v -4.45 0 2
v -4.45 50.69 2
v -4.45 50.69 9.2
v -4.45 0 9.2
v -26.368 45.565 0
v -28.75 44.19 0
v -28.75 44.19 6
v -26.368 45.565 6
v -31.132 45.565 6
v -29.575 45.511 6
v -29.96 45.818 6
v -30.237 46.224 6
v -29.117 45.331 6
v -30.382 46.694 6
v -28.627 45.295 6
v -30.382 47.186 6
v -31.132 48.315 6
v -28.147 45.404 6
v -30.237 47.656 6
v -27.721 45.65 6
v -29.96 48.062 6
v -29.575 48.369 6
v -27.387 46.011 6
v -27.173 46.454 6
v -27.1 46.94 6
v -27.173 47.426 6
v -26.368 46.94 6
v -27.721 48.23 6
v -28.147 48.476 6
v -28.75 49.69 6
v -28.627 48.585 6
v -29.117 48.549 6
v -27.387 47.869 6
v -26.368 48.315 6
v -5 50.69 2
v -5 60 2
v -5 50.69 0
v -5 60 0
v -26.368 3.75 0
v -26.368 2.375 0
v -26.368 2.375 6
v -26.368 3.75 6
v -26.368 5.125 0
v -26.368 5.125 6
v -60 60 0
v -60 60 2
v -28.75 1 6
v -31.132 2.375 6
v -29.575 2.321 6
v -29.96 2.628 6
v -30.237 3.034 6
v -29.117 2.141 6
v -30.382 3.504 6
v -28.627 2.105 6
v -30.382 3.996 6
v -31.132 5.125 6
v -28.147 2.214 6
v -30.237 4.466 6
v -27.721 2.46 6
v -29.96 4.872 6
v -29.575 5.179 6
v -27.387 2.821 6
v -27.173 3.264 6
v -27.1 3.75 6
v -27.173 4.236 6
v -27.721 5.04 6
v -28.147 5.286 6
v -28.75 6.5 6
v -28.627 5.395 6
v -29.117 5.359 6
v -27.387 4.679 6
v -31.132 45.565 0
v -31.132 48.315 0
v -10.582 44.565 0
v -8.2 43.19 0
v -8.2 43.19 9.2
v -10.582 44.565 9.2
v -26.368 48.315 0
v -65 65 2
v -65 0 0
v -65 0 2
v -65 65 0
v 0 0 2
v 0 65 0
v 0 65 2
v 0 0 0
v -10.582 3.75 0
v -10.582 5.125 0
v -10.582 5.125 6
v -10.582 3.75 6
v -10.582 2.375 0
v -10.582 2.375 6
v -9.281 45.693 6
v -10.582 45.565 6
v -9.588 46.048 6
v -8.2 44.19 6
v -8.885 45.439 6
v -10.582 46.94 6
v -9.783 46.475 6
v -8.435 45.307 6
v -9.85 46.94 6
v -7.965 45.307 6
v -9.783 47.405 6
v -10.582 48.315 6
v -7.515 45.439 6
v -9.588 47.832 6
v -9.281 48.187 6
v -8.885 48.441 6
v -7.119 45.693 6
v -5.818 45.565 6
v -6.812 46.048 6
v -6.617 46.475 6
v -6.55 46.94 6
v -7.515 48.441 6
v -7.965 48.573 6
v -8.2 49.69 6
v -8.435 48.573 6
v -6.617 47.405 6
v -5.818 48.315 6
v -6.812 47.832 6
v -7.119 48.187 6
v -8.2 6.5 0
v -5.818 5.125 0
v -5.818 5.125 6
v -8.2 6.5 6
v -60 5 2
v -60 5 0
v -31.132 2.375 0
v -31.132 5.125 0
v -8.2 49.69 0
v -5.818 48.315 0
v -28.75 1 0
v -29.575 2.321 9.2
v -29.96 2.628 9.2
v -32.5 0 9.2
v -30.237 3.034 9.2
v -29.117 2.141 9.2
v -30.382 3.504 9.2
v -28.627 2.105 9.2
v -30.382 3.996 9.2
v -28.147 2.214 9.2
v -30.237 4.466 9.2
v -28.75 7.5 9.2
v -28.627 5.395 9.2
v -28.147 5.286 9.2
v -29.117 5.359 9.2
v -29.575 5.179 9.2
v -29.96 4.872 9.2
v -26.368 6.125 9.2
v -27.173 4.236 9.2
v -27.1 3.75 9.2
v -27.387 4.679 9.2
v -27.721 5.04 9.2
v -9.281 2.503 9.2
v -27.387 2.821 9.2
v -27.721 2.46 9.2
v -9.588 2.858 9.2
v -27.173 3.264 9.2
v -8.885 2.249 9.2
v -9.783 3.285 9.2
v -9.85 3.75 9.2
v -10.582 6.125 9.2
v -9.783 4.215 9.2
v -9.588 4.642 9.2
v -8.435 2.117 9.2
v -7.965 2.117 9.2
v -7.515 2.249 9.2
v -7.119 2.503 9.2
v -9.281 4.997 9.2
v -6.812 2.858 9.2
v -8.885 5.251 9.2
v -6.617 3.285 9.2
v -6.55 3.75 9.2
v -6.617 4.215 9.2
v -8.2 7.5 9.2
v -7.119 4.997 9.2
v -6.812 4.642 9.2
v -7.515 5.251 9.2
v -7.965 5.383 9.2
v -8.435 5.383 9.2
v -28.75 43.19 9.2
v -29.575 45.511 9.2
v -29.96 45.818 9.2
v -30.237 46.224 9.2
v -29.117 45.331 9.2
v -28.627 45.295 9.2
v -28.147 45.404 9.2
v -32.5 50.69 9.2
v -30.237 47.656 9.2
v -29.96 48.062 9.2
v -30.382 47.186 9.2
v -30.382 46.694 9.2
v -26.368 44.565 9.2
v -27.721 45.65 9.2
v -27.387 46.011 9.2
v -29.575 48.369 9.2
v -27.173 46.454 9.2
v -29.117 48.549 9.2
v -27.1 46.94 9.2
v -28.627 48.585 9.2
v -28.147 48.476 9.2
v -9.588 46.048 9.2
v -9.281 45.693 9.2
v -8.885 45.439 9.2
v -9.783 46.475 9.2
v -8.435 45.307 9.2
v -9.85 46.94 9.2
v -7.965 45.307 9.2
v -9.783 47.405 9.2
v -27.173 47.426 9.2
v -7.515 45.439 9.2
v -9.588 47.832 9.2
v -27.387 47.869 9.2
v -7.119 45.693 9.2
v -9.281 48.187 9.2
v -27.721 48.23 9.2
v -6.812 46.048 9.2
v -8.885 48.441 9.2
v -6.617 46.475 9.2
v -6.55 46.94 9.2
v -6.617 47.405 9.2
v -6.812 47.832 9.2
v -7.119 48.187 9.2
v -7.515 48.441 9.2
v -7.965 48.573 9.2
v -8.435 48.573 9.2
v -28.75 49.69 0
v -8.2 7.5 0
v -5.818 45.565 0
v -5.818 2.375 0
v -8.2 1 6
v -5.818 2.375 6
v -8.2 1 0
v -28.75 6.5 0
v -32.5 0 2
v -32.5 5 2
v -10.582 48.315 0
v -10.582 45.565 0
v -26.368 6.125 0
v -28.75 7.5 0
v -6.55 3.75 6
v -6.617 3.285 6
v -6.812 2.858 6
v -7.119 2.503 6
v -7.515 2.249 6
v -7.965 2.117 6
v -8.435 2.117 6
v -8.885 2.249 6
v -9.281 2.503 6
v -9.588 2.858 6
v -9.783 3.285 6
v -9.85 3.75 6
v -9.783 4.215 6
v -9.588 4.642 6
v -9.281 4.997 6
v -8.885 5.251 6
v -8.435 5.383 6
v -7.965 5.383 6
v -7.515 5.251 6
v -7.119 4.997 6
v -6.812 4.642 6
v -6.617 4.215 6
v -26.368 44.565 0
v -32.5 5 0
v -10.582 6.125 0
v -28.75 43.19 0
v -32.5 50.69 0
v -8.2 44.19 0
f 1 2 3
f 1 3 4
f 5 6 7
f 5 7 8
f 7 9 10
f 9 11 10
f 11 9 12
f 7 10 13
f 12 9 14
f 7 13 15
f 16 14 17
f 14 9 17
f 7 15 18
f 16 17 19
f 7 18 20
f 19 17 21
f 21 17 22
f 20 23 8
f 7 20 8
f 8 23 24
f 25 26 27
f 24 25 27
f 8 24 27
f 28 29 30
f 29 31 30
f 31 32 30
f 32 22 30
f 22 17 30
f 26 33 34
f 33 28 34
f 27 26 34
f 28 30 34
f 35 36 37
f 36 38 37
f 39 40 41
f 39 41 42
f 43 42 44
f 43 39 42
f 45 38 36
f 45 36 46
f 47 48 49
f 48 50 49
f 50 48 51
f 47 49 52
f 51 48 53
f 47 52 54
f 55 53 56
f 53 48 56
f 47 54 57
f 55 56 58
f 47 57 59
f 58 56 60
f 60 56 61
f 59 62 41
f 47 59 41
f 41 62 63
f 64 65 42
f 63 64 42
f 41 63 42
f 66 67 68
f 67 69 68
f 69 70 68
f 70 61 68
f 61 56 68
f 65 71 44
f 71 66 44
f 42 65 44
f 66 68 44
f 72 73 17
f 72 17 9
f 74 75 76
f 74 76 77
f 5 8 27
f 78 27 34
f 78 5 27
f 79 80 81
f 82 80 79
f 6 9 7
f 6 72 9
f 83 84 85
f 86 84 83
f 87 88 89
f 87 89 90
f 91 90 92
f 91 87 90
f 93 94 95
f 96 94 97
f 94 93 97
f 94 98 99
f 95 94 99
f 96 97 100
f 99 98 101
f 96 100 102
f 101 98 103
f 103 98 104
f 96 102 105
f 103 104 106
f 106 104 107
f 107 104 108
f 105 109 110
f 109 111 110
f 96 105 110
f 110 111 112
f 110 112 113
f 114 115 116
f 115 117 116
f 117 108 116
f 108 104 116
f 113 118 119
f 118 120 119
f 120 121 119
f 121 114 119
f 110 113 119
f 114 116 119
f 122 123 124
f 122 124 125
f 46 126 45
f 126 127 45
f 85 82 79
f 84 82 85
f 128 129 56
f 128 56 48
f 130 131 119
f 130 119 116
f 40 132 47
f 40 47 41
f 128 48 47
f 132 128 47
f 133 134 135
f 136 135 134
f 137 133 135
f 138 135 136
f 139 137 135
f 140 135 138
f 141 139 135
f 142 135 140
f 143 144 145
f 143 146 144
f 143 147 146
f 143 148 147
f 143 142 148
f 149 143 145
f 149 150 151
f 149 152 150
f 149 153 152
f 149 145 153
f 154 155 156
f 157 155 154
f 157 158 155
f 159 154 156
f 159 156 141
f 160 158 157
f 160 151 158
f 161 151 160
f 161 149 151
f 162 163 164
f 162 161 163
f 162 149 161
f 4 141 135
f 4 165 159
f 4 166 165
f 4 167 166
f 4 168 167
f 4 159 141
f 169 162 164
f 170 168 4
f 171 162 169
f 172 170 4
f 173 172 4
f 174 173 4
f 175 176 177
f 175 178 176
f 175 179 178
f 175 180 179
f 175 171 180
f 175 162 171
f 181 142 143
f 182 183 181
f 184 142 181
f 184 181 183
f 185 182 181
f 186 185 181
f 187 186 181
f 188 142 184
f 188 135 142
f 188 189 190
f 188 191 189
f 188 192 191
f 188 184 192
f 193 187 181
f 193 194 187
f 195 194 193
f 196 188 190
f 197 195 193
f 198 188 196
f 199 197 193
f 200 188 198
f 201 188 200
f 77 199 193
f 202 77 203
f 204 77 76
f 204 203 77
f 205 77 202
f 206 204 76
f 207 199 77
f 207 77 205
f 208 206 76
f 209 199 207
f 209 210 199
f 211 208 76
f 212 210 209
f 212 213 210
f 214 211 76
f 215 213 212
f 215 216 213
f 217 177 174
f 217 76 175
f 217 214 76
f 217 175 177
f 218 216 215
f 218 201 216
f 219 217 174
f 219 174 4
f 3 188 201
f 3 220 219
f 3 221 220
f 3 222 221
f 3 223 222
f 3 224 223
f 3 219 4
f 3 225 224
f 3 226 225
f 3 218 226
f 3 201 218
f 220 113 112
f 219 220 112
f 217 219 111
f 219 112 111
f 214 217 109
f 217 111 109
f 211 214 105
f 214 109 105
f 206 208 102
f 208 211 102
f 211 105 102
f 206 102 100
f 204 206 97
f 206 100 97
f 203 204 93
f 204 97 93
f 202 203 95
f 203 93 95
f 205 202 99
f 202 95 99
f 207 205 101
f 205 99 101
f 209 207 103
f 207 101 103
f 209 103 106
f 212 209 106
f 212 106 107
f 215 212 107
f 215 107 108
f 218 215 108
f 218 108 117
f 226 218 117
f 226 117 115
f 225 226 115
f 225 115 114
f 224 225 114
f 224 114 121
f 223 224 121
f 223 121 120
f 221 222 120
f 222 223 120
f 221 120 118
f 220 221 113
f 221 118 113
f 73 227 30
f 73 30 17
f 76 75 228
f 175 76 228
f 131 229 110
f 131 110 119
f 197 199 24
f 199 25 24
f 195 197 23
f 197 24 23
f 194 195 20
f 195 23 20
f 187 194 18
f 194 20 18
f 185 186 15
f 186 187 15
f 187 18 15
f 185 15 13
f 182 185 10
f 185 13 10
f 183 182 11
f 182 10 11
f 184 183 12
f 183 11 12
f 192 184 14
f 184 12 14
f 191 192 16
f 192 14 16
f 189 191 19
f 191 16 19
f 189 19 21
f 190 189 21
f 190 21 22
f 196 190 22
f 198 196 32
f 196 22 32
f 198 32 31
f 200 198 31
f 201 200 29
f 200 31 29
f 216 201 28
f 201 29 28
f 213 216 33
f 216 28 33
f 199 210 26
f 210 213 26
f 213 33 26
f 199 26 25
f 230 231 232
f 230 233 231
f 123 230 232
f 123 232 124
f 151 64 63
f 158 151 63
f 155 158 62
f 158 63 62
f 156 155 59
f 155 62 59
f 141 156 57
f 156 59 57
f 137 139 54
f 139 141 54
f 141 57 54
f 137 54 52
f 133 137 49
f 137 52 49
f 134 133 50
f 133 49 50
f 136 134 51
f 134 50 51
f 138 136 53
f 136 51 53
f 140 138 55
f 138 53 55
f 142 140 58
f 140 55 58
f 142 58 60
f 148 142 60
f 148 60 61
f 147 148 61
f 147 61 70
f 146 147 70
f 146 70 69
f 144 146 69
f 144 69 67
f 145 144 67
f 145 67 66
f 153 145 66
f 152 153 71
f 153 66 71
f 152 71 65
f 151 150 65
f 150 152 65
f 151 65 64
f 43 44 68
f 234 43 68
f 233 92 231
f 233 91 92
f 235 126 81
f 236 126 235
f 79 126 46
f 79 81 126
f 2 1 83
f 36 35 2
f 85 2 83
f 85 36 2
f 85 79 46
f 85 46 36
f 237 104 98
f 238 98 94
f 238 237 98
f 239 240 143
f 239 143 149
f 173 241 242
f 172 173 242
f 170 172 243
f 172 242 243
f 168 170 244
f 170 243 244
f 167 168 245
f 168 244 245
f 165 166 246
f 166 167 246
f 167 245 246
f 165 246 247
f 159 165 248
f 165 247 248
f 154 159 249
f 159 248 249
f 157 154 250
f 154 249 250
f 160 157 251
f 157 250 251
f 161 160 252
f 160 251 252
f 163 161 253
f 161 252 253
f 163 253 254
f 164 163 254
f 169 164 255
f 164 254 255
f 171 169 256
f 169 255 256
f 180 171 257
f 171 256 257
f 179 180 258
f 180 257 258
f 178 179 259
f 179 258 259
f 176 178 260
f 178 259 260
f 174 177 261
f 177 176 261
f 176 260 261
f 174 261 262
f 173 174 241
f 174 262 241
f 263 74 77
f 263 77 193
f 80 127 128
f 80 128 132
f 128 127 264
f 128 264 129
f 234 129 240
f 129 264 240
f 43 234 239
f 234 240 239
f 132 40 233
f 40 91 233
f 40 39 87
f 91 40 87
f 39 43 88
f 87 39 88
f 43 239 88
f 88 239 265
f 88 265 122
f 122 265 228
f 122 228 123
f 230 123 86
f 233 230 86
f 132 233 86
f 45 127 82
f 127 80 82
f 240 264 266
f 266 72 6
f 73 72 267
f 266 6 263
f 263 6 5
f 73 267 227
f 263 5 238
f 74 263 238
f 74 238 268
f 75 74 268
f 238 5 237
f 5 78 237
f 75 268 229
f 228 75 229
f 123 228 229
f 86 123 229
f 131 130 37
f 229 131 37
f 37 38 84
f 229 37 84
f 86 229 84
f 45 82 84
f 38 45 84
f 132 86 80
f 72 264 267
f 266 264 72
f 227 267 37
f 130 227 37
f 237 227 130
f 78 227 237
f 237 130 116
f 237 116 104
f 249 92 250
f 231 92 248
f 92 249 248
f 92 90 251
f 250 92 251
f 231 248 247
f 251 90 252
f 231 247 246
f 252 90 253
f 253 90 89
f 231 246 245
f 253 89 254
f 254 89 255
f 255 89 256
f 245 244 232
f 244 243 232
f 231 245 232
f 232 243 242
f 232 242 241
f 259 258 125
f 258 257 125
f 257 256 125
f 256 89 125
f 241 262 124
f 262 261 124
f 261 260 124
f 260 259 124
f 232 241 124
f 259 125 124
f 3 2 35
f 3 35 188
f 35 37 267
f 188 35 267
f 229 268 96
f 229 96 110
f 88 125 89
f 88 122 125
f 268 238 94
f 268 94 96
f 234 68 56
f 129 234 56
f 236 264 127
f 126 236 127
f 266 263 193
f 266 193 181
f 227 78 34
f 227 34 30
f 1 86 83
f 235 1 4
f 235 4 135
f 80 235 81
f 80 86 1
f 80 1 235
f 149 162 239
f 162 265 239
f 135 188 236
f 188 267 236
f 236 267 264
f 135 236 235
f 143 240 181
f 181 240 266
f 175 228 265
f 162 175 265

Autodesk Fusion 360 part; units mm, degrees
sketch "Sketch1" plane through (0, 0, 0) normal (0, 0, 1) x (1, 0, 0)
  line L0 (0, 0) -> (-65, 0)
  line L1 (-65, 0) -> (-65, 65)
  line L2 (-65, 65) -> (0, 65)
  line L3 (0, 65) -> (0, 0)
  line L4 (-32.5, 65) -> (-32.5, 0)
  line L5 (-28.75, 1) -> (-26.3684, 2.375)
  line L6 (-26.3684, 2.375) -> (-26.3684, 5.125)
  line L7 (-26.3684, 5.125) -> (-28.75, 6.5)
  line L8 (-28.75, 6.5) -> (-31.1316, 5.125)
  line L9 (-31.1316, 5.125) -> (-31.1316, 2.375)
  line L10 (-31.1316, 2.375) -> (-28.75, 1)
  line L11 (-28.75, 44.19) -> (-26.3684, 45.565)
  line L12 (-26.3684, 45.565) -> (-26.3684, 48.315)
  line L13 (-26.3684, 48.315) -> (-28.75, 49.69)
  line L14 (-28.75, 49.69) -> (-31.1316, 48.315)
  line L15 (-31.1316, 48.315) -> (-31.1316, 45.565)
  line L16 (-31.1316, 45.565) -> (-28.75, 44.19)
  line L17 (-28.75, 49.69) -> (-28.75, 50.69)
  line L18 (-28.75, 50.69) -> (-32.5, 50.69)
  line L19 (-28.75, 50.69) -> (0, 50.69)
  line L20 (-65, 0) -> (-60, 0)
  line L21 (-60, 0) -> (-60, 5)
  line L22 (-60, 5) -> (-65, 5)
  line L23 (-65, 5) -> (-65, 0)
  line L24 (-65, 65) -> (-60, 65)
  line L25 (-60, 65) -> (-60, 60)
  line L26 (-60, 60) -> (-65, 60)
  line L27 (-65, 60) -> (-65, 65)
  line L28 (0, 65) -> (-5, 65)
  line L29 (-5, 65) -> (-5, 60)
  line L30 (-5, 60) -> (0, 60)
  line L31 (0, 60) -> (0, 65)
  line L32 (-5, 60) -> (-60, 60)
  line L33 (-60, 60) -> (-60, 65)
  line L34 (-60, 65) -> (-5, 65)
  line L35 (-5, 65) -> (-5, 60)
  line L36 (-60, 60) -> (-65, 60)
  line L37 (-65, 60) -> (-65, 5)
  line L38 (-65, 5) -> (-60, 5)
  line L39 (-60, 5) -> (-60, 60)
  line L40 (-60, 0) -> (-32.5, 0)
  line L41 (-32.5, 0) -> (-32.5, 5)
  line L42 (-32.5, 5) -> (-60, 5)
  line L43 (-60, 5) -> (-60, 0)
  line L44 (-28.75, 6.5) -> (-28.75, 7.5)
  line L45 (-28.75, 7.5) -> (-26.3684, 6.125)
  line L46 (-28.75, 44.19) -> (-28.75, 43.19)
  line L47 (-3.75, 44.19) -> (-3.75, 43.19)
  line L48 (-26.3684, 44.565) -> (-28.75, 43.19)
  line L49 (-28.75, 7.5) -> (-28.75, 43.19)
  circle A0 centre (-28.75, 46.94) radius 1.65
  circle A1 centre (-28.75, 3.75) radius 1.65
  line L50 (-5, 60) -> (-5, 50.69)
  line L51 (-28.75, 46.94) -> (-8.2, 46.94)
  circle A2 centre (-8.2, 46.94) radius 1.65
  line L52 (-28.75, 3.75) -> (-8.2, 3.75)
  circle A3 centre (-8.2, 3.75) radius 1.65
  line L53 (-8.2, 1) -> (-5.8184, 2.375)
  line L54 (-5.8184, 2.375) -> (-5.8184, 5.125)
  line L55 (-5.8184, 5.125) -> (-8.2, 6.5)
  line L56 (-8.2, 6.5) -> (-10.5816, 5.125)
  line L57 (-10.5816, 5.125) -> (-10.5816, 2.375)
  line L58 (-10.5816, 2.375) -> (-8.2, 1)
  line L59 (-8.2, 44.19) -> (-5.8184, 45.565)
  line L60 (-5.8184, 45.565) -> (-5.8184, 48.315)
  line L61 (-5.8184, 48.315) -> (-8.2, 49.69)
  line L62 (-8.2, 49.69) -> (-10.5816, 48.315)
  line L63 (-10.5816, 48.315) -> (-10.5816, 45.565)
  line L64 (-10.5816, 45.565) -> (-8.2, 44.19)
  line L65 (-8.2, 44.19) -> (-8.2, 43.19)
  line L66 (-8.2, 43.19) -> (-10.5816, 44.565)
  line L67 (-10.5816, 44.565) -> (-26.3684, 44.565)
  line L68 (-8.2, 43.19) -> (-8.2, 7.5)
  line L69 (-8.2, 7.5) -> (-10.5816, 6.125)
  line L70 (-10.5816, 6.125) -> (-26.3684, 6.125)
  line L71 (-8.2, 25.345) -> (-4.45, 25.345)
  line L72 (-4.45, 25.345) -> (-4.45, 0)
  line L73 (-4.45, 25.345) -> (-4.45, 50.69)
  point P0 (-28.75, 3.75)
  point P1 (-28.75, 46.94)
  point P2 (-8.2, 3.75)
  point P3 (-8.2, 46.94)
  dimension "d1" = 65
  dimension "d2" = 65
  dimension "d10" = 43.19
  dimension "d12" = 2.75
  dimension "d14" = 1
  dimension "d15" = 1
  dimension "d17" = 3.3
  dimension "d20" = 3.3
  dimension "d27" = 20.55
  dimension "d28" = 3.3
  dimension "d29" = 20.55
  dimension "d30" = 3.3
  dimension "d31" = 2.75
  dimension "d32" = 1
  dimension "d33" = 3.75
extrude "Extrude4" add sketch "Sketch1" along normal blind 9.2 contours L53 L54 L55 L56 L57 L58 | L5 L6 L7 L8 L9 L10 | L0 L4 L14 L15 L16 L17 L18 L41 L45 L46 L49 L68 L69 L70 L71 L72 | L12 L13 L17 L19 L51 L59 L60 L61 L62 L63 L65 L68 L71 L73 | L11 L12 L46 L48 L51 L63 L64 L65 L66 L67 | L59 L60 L61 L62 L63 L64 | L11 L12 L13 L14 L15 L16
extrude "Extrude5" add sketch "Sketch1" along normal blind 2 contours L0 L3 L19 L72 L73 | L3 L19 L30 L50 | L0 L4 L21 L40 L41 L42 L43 | L2 L3 L28 L29 L30 L31 L35 | L0 L1 L20 L21 L22 L23 L38 L43 | L2 L4 L29 L32 L34 L35 | L1 L22 L26 L36 L37 L38 L39 | L2 L4 L25 L32 L33 L34 | L1 L2 L24 L25 L26 L27 L33 L36
extrude "Extrude6" cut sketch "Sketch1" along normal blind 6 contours L53 L54 L55 L56 L57 L58 | L5 L6 L7 L8 L9 L10 | L59 L60 L61 L62 L63 L64 | L11 L12 L13 L14 L15 L16
